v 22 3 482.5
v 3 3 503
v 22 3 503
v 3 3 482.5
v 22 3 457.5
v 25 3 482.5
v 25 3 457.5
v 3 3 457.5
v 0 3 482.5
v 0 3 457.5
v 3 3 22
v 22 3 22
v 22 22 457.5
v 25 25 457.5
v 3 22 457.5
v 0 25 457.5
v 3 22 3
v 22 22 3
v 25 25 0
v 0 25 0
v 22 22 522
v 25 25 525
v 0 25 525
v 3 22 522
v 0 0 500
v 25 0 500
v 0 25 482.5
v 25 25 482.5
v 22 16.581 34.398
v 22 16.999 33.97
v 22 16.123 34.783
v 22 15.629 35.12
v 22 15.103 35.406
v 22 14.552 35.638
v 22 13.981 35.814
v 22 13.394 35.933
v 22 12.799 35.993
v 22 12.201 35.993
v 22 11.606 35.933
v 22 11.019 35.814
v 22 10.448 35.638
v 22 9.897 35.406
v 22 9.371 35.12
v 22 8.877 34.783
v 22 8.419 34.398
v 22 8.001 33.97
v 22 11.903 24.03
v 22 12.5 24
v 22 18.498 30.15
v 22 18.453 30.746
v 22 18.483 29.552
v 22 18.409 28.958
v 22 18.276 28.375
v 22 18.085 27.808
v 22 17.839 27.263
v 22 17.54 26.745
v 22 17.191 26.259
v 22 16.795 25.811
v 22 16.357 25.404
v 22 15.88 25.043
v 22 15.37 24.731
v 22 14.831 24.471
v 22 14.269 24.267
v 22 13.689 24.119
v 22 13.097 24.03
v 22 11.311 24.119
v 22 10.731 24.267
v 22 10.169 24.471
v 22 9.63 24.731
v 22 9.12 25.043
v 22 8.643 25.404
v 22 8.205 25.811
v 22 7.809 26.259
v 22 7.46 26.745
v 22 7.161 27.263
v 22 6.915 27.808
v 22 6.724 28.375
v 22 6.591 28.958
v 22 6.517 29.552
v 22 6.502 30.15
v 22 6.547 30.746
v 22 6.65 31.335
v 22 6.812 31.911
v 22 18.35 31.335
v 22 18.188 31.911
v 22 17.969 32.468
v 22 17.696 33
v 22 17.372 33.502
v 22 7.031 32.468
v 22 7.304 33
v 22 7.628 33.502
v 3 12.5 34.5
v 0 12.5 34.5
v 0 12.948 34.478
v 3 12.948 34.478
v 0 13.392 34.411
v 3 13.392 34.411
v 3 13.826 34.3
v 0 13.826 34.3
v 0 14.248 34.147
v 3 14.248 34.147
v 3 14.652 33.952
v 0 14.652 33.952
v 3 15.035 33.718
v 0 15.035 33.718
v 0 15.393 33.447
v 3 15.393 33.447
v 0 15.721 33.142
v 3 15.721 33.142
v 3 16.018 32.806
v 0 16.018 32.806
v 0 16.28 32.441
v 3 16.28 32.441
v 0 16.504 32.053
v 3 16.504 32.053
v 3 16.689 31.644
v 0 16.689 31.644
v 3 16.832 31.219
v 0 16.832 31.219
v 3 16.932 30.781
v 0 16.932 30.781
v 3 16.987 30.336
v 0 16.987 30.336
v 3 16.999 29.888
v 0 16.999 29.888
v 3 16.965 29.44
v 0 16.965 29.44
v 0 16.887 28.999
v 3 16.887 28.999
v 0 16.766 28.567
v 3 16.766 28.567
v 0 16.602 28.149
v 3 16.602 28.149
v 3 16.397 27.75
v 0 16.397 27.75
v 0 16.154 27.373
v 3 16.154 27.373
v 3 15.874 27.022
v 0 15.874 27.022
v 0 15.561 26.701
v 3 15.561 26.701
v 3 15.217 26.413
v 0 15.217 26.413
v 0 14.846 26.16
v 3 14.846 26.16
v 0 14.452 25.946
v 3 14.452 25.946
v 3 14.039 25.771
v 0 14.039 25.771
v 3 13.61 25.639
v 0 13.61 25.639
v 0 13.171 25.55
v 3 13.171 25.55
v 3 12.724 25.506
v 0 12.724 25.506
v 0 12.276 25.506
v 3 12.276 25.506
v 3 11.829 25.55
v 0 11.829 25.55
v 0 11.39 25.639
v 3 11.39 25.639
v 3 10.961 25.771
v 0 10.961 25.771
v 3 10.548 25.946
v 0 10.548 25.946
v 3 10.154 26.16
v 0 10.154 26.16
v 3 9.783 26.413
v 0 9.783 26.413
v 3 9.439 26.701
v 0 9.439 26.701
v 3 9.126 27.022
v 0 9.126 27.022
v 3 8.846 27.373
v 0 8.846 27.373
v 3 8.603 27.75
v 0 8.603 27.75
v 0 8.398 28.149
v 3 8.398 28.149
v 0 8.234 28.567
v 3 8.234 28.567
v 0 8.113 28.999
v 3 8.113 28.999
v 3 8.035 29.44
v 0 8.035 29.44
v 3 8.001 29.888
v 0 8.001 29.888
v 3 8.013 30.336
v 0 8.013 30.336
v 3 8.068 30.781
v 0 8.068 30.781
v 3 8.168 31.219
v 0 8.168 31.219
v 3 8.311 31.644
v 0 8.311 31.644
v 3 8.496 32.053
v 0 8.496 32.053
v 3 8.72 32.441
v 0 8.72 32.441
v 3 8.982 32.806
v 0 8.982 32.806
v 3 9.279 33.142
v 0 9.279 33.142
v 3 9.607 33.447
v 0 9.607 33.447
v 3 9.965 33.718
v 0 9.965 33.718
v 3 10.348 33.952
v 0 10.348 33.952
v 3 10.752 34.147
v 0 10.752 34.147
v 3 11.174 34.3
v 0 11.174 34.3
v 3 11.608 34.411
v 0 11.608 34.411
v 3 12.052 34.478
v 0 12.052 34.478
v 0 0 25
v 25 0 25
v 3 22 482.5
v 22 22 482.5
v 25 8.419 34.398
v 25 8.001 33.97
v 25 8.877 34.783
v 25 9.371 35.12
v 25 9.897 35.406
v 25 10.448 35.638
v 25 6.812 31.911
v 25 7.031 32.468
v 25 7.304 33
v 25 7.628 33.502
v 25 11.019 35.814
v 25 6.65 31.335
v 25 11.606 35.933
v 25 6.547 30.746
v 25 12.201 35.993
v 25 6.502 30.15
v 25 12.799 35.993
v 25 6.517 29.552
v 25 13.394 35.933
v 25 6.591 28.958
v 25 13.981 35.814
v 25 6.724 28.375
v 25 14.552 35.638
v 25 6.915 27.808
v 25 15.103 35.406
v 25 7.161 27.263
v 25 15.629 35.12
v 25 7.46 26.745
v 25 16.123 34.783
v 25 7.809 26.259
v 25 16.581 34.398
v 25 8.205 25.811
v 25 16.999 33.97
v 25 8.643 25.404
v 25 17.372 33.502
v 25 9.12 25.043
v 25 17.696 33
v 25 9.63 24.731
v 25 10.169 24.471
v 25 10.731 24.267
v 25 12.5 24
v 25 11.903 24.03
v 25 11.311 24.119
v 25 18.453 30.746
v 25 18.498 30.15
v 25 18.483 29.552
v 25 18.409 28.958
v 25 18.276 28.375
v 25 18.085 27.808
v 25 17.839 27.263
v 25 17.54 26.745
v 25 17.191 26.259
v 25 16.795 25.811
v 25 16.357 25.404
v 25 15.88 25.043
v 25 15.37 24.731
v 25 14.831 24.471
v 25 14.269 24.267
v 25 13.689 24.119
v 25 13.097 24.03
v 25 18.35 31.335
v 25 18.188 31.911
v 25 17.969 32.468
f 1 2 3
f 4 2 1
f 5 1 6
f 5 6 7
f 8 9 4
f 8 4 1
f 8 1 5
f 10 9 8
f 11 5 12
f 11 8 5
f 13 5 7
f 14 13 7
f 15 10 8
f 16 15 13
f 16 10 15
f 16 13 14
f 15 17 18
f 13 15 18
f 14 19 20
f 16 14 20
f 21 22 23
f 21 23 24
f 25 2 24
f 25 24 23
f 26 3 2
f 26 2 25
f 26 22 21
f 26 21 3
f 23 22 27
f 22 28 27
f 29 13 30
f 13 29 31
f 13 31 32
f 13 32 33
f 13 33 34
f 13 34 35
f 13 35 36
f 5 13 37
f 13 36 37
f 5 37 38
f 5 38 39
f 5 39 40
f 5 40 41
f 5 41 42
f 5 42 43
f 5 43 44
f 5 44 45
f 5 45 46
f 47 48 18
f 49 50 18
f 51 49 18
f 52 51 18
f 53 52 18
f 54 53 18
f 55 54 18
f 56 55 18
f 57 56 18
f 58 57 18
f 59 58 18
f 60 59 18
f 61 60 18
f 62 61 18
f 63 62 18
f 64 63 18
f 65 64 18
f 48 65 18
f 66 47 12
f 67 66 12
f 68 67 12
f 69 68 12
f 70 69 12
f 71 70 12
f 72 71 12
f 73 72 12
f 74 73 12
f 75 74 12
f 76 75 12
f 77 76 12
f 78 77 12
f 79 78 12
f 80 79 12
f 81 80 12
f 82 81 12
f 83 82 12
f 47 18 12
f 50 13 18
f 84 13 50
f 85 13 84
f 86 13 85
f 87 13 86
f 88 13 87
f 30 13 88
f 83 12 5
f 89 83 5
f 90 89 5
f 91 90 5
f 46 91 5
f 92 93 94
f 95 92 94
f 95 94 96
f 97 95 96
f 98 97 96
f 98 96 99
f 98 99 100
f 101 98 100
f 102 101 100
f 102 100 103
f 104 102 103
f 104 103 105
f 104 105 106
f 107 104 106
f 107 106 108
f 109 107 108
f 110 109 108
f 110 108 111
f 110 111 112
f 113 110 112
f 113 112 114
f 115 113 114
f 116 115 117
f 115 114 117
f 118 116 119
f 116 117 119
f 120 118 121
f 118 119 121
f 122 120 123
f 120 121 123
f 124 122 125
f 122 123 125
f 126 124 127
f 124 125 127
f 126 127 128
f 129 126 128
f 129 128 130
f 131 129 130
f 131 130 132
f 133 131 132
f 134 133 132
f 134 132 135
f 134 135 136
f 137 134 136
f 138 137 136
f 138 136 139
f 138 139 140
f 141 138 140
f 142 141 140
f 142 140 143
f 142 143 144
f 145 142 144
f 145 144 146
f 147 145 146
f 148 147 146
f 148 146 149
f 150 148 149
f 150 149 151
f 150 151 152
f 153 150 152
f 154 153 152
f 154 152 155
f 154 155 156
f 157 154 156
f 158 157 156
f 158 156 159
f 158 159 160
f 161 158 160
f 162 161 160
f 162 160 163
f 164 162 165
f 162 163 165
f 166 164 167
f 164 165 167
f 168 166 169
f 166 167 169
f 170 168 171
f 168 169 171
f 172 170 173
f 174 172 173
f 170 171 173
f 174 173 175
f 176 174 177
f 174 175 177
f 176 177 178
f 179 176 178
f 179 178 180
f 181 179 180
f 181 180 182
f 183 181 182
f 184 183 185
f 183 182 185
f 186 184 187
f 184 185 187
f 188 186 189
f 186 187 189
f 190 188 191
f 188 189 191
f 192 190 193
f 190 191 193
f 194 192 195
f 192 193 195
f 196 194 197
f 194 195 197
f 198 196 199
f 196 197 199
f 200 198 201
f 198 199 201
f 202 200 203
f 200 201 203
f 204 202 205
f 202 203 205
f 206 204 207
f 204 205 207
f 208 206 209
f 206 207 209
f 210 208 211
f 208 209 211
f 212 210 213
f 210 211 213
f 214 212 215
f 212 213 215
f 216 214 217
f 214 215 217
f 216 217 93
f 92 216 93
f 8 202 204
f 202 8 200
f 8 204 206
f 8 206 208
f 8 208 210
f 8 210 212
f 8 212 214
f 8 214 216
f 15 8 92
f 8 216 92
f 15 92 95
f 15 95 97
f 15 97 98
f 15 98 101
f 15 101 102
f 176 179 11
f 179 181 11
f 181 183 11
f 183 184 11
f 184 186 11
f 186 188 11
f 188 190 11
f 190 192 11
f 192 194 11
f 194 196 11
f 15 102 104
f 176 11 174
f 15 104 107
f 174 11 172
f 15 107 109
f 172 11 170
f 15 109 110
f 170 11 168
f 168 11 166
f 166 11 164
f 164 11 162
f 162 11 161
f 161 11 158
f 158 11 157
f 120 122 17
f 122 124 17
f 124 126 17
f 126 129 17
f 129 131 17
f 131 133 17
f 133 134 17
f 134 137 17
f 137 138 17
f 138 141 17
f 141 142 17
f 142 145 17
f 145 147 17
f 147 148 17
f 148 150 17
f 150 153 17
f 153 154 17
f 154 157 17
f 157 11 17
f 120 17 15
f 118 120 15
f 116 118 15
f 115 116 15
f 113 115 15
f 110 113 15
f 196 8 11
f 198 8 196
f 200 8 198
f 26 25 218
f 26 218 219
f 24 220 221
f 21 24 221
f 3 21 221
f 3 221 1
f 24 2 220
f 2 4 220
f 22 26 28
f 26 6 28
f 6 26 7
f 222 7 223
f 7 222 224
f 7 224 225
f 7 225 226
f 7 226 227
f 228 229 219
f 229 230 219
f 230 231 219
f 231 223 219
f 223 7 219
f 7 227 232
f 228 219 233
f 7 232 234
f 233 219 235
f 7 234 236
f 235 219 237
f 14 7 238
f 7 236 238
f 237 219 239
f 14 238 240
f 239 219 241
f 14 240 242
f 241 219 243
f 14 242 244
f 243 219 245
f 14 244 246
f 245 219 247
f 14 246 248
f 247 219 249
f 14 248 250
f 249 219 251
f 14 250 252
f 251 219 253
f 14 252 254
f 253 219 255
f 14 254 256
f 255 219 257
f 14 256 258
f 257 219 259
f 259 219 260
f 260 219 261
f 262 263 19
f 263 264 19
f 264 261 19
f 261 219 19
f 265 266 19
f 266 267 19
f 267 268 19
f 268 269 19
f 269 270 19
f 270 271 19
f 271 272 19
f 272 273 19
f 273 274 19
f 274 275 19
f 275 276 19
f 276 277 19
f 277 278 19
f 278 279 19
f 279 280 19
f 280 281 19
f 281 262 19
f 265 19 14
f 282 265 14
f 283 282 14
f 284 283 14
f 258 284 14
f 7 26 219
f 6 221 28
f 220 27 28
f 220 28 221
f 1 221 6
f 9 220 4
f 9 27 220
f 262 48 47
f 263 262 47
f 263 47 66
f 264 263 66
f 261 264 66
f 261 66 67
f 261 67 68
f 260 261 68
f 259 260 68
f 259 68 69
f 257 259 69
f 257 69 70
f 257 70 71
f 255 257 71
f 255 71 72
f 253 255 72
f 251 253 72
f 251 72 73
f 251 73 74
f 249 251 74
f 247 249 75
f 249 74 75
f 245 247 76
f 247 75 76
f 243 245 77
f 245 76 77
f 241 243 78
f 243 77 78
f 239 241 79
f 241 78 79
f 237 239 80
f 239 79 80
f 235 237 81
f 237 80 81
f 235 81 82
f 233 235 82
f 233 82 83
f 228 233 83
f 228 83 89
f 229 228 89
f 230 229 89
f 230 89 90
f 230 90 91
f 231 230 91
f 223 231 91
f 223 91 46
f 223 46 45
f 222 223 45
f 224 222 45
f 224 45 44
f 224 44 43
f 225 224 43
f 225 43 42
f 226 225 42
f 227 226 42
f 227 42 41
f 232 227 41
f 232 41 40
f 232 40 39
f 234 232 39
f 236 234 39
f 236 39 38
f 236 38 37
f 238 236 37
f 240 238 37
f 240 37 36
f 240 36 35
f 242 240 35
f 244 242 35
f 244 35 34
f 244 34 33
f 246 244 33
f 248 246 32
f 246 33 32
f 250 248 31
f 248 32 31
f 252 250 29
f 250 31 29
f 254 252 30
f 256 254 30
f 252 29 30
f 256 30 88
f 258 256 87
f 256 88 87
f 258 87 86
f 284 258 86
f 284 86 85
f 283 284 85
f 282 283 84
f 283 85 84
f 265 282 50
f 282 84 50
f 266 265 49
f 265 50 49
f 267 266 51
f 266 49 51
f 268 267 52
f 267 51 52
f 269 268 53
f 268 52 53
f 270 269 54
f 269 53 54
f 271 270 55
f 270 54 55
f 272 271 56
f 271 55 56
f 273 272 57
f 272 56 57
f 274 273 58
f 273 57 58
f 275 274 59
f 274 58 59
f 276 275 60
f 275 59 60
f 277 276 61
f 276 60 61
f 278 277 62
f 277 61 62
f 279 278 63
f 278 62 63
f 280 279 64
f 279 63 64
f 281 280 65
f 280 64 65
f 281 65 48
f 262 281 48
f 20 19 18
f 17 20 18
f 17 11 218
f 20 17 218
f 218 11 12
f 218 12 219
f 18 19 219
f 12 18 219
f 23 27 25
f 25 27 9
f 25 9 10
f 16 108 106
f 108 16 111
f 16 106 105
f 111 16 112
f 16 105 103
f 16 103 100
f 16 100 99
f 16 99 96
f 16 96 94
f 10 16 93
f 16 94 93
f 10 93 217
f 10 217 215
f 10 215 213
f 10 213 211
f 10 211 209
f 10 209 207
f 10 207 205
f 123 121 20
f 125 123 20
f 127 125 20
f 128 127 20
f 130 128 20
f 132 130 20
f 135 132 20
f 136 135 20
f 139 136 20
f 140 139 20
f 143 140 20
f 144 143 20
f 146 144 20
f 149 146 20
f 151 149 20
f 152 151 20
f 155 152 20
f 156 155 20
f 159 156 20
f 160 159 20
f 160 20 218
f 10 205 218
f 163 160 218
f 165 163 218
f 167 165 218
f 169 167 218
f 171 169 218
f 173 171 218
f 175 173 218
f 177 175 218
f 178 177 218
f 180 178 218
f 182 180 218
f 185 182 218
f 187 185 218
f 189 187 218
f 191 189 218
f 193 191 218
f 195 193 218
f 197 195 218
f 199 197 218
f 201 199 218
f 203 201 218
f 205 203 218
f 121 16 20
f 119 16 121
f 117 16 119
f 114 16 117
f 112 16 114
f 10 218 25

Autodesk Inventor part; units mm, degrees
ref_plane "YZ Plane" through (0, 0, 0) normal (1, 0, 0) x (0, 1, 0)
ref_plane "XZ Plane" through (0, 0, 0) normal (0, 1, 0) x (-1, 0, 0)
ref_plane "XY Plane" through (0, 0, 0) normal (0, 0, 1) x (1, 0, 0)
sketch "Sketch1" plane through (0, 0, 0) normal (0, 0, 1) x (1, 0, 0)
  line L0 (0, 0) -> (25, 0)
  line L1 (25, 0) -> (25, 25)
  line L2 (25, 25) -> (0, 25)
  line L3 (0, 25) -> (0, 0)
  line L4 (3, 22) -> (22, 22)
  line L5 (22, 22) -> (22, 3)
  line L6 (22, 3) -> (3, 3)
  line L7 (3, 3) -> (3, 22)
  dimension "d0" = 25
  dimension "d1" = 25
  dimension "d2" = 3
extrude "Extrusion1" add sketch "Sketch1" along normal blind 525
sketch "Sketch2" plane through (25, 0, 0) normal (1, 0, 0) x (0, 0, -1)
  line L0 (0, 0) -> (0, 25) projected
  line L1 (0, 25) -> (-525, 25) projected
  line L2 (-525, 0) -> (-525, 25) projected
  line L3 (0, 0) -> (-525, 0) projected
  line L4 (-525, 25) -> (-500, 0)
  line L5 (-525, 25) -> (-489.6447, 25) construction
  line L6 (0, 25) -> (-25, 0)
  line L7 (0, 25) -> (35.3553, 25) construction
  dimension "d5" = 45
  dimension "d6" = 135
extrude "Extrusion2" cut sketch "Sketch2" against normal blind 500 contours L3 L6 L0 | L4 L3 L2
sketch "Sketch3" plane through (25, 25, 525) normal (1, 0, 0) x (0, 0, -1)
  line L0 (500, -25) -> (25, -25) projected
  line L1 (525, 0) -> (0, 0) projected
  line L2 (25, -25) -> (0, 0) projected
  point P0 (525, -25)
  point P1 (55, -12.5)
  point P2 (495, -12.5)
  point P3 (262.5, 0)
  point P4 (12.5, -12.5)
  point P5 (12.5, -12.5)
  dimension "d9" = 440
  dimension "d10" = 12.5
  dimension "d50" = 42.5
hole "Hole1" at (25, 12.5, 30) direction (-1, 0, 0) diameter 12 depth 8 tip angle 118
sketch "Sketch5" plane through (0, 25, 0) normal (-1, 0, 0) x (0, 0, 1)
  circle A0 centre (30, -12.5) radius 6 projected
  line L0 (0, 0) -> (525, 0) projected
  line L1 (457.5, 0) -> (482.5, 0)
  line L2 (482.5, 0) -> (482.5, -22)
  line L3 (482.5, -22) -> (457.5, -22)
  line L4 (457.5, -22) -> (457.5, 0)
  circle A1 centre (30, -12.5) radius 4.5
  point P0 (0, -25)
  point P1 (470, -12.5)
  point P2 (470, 0)
  dimension "d33" = 440
  dimension "d51" = 12.5
  dimension "d52" = 25
  dimension "d53" = 22
  dimension "d54" = 0
  dimension "d57" = 9
extrude "Extrusion3" cut sketch "Sketch5" against normal through all contours L0 L2 L3 L4 | A1
properties part number "P402" material "Aluminum 6061"
